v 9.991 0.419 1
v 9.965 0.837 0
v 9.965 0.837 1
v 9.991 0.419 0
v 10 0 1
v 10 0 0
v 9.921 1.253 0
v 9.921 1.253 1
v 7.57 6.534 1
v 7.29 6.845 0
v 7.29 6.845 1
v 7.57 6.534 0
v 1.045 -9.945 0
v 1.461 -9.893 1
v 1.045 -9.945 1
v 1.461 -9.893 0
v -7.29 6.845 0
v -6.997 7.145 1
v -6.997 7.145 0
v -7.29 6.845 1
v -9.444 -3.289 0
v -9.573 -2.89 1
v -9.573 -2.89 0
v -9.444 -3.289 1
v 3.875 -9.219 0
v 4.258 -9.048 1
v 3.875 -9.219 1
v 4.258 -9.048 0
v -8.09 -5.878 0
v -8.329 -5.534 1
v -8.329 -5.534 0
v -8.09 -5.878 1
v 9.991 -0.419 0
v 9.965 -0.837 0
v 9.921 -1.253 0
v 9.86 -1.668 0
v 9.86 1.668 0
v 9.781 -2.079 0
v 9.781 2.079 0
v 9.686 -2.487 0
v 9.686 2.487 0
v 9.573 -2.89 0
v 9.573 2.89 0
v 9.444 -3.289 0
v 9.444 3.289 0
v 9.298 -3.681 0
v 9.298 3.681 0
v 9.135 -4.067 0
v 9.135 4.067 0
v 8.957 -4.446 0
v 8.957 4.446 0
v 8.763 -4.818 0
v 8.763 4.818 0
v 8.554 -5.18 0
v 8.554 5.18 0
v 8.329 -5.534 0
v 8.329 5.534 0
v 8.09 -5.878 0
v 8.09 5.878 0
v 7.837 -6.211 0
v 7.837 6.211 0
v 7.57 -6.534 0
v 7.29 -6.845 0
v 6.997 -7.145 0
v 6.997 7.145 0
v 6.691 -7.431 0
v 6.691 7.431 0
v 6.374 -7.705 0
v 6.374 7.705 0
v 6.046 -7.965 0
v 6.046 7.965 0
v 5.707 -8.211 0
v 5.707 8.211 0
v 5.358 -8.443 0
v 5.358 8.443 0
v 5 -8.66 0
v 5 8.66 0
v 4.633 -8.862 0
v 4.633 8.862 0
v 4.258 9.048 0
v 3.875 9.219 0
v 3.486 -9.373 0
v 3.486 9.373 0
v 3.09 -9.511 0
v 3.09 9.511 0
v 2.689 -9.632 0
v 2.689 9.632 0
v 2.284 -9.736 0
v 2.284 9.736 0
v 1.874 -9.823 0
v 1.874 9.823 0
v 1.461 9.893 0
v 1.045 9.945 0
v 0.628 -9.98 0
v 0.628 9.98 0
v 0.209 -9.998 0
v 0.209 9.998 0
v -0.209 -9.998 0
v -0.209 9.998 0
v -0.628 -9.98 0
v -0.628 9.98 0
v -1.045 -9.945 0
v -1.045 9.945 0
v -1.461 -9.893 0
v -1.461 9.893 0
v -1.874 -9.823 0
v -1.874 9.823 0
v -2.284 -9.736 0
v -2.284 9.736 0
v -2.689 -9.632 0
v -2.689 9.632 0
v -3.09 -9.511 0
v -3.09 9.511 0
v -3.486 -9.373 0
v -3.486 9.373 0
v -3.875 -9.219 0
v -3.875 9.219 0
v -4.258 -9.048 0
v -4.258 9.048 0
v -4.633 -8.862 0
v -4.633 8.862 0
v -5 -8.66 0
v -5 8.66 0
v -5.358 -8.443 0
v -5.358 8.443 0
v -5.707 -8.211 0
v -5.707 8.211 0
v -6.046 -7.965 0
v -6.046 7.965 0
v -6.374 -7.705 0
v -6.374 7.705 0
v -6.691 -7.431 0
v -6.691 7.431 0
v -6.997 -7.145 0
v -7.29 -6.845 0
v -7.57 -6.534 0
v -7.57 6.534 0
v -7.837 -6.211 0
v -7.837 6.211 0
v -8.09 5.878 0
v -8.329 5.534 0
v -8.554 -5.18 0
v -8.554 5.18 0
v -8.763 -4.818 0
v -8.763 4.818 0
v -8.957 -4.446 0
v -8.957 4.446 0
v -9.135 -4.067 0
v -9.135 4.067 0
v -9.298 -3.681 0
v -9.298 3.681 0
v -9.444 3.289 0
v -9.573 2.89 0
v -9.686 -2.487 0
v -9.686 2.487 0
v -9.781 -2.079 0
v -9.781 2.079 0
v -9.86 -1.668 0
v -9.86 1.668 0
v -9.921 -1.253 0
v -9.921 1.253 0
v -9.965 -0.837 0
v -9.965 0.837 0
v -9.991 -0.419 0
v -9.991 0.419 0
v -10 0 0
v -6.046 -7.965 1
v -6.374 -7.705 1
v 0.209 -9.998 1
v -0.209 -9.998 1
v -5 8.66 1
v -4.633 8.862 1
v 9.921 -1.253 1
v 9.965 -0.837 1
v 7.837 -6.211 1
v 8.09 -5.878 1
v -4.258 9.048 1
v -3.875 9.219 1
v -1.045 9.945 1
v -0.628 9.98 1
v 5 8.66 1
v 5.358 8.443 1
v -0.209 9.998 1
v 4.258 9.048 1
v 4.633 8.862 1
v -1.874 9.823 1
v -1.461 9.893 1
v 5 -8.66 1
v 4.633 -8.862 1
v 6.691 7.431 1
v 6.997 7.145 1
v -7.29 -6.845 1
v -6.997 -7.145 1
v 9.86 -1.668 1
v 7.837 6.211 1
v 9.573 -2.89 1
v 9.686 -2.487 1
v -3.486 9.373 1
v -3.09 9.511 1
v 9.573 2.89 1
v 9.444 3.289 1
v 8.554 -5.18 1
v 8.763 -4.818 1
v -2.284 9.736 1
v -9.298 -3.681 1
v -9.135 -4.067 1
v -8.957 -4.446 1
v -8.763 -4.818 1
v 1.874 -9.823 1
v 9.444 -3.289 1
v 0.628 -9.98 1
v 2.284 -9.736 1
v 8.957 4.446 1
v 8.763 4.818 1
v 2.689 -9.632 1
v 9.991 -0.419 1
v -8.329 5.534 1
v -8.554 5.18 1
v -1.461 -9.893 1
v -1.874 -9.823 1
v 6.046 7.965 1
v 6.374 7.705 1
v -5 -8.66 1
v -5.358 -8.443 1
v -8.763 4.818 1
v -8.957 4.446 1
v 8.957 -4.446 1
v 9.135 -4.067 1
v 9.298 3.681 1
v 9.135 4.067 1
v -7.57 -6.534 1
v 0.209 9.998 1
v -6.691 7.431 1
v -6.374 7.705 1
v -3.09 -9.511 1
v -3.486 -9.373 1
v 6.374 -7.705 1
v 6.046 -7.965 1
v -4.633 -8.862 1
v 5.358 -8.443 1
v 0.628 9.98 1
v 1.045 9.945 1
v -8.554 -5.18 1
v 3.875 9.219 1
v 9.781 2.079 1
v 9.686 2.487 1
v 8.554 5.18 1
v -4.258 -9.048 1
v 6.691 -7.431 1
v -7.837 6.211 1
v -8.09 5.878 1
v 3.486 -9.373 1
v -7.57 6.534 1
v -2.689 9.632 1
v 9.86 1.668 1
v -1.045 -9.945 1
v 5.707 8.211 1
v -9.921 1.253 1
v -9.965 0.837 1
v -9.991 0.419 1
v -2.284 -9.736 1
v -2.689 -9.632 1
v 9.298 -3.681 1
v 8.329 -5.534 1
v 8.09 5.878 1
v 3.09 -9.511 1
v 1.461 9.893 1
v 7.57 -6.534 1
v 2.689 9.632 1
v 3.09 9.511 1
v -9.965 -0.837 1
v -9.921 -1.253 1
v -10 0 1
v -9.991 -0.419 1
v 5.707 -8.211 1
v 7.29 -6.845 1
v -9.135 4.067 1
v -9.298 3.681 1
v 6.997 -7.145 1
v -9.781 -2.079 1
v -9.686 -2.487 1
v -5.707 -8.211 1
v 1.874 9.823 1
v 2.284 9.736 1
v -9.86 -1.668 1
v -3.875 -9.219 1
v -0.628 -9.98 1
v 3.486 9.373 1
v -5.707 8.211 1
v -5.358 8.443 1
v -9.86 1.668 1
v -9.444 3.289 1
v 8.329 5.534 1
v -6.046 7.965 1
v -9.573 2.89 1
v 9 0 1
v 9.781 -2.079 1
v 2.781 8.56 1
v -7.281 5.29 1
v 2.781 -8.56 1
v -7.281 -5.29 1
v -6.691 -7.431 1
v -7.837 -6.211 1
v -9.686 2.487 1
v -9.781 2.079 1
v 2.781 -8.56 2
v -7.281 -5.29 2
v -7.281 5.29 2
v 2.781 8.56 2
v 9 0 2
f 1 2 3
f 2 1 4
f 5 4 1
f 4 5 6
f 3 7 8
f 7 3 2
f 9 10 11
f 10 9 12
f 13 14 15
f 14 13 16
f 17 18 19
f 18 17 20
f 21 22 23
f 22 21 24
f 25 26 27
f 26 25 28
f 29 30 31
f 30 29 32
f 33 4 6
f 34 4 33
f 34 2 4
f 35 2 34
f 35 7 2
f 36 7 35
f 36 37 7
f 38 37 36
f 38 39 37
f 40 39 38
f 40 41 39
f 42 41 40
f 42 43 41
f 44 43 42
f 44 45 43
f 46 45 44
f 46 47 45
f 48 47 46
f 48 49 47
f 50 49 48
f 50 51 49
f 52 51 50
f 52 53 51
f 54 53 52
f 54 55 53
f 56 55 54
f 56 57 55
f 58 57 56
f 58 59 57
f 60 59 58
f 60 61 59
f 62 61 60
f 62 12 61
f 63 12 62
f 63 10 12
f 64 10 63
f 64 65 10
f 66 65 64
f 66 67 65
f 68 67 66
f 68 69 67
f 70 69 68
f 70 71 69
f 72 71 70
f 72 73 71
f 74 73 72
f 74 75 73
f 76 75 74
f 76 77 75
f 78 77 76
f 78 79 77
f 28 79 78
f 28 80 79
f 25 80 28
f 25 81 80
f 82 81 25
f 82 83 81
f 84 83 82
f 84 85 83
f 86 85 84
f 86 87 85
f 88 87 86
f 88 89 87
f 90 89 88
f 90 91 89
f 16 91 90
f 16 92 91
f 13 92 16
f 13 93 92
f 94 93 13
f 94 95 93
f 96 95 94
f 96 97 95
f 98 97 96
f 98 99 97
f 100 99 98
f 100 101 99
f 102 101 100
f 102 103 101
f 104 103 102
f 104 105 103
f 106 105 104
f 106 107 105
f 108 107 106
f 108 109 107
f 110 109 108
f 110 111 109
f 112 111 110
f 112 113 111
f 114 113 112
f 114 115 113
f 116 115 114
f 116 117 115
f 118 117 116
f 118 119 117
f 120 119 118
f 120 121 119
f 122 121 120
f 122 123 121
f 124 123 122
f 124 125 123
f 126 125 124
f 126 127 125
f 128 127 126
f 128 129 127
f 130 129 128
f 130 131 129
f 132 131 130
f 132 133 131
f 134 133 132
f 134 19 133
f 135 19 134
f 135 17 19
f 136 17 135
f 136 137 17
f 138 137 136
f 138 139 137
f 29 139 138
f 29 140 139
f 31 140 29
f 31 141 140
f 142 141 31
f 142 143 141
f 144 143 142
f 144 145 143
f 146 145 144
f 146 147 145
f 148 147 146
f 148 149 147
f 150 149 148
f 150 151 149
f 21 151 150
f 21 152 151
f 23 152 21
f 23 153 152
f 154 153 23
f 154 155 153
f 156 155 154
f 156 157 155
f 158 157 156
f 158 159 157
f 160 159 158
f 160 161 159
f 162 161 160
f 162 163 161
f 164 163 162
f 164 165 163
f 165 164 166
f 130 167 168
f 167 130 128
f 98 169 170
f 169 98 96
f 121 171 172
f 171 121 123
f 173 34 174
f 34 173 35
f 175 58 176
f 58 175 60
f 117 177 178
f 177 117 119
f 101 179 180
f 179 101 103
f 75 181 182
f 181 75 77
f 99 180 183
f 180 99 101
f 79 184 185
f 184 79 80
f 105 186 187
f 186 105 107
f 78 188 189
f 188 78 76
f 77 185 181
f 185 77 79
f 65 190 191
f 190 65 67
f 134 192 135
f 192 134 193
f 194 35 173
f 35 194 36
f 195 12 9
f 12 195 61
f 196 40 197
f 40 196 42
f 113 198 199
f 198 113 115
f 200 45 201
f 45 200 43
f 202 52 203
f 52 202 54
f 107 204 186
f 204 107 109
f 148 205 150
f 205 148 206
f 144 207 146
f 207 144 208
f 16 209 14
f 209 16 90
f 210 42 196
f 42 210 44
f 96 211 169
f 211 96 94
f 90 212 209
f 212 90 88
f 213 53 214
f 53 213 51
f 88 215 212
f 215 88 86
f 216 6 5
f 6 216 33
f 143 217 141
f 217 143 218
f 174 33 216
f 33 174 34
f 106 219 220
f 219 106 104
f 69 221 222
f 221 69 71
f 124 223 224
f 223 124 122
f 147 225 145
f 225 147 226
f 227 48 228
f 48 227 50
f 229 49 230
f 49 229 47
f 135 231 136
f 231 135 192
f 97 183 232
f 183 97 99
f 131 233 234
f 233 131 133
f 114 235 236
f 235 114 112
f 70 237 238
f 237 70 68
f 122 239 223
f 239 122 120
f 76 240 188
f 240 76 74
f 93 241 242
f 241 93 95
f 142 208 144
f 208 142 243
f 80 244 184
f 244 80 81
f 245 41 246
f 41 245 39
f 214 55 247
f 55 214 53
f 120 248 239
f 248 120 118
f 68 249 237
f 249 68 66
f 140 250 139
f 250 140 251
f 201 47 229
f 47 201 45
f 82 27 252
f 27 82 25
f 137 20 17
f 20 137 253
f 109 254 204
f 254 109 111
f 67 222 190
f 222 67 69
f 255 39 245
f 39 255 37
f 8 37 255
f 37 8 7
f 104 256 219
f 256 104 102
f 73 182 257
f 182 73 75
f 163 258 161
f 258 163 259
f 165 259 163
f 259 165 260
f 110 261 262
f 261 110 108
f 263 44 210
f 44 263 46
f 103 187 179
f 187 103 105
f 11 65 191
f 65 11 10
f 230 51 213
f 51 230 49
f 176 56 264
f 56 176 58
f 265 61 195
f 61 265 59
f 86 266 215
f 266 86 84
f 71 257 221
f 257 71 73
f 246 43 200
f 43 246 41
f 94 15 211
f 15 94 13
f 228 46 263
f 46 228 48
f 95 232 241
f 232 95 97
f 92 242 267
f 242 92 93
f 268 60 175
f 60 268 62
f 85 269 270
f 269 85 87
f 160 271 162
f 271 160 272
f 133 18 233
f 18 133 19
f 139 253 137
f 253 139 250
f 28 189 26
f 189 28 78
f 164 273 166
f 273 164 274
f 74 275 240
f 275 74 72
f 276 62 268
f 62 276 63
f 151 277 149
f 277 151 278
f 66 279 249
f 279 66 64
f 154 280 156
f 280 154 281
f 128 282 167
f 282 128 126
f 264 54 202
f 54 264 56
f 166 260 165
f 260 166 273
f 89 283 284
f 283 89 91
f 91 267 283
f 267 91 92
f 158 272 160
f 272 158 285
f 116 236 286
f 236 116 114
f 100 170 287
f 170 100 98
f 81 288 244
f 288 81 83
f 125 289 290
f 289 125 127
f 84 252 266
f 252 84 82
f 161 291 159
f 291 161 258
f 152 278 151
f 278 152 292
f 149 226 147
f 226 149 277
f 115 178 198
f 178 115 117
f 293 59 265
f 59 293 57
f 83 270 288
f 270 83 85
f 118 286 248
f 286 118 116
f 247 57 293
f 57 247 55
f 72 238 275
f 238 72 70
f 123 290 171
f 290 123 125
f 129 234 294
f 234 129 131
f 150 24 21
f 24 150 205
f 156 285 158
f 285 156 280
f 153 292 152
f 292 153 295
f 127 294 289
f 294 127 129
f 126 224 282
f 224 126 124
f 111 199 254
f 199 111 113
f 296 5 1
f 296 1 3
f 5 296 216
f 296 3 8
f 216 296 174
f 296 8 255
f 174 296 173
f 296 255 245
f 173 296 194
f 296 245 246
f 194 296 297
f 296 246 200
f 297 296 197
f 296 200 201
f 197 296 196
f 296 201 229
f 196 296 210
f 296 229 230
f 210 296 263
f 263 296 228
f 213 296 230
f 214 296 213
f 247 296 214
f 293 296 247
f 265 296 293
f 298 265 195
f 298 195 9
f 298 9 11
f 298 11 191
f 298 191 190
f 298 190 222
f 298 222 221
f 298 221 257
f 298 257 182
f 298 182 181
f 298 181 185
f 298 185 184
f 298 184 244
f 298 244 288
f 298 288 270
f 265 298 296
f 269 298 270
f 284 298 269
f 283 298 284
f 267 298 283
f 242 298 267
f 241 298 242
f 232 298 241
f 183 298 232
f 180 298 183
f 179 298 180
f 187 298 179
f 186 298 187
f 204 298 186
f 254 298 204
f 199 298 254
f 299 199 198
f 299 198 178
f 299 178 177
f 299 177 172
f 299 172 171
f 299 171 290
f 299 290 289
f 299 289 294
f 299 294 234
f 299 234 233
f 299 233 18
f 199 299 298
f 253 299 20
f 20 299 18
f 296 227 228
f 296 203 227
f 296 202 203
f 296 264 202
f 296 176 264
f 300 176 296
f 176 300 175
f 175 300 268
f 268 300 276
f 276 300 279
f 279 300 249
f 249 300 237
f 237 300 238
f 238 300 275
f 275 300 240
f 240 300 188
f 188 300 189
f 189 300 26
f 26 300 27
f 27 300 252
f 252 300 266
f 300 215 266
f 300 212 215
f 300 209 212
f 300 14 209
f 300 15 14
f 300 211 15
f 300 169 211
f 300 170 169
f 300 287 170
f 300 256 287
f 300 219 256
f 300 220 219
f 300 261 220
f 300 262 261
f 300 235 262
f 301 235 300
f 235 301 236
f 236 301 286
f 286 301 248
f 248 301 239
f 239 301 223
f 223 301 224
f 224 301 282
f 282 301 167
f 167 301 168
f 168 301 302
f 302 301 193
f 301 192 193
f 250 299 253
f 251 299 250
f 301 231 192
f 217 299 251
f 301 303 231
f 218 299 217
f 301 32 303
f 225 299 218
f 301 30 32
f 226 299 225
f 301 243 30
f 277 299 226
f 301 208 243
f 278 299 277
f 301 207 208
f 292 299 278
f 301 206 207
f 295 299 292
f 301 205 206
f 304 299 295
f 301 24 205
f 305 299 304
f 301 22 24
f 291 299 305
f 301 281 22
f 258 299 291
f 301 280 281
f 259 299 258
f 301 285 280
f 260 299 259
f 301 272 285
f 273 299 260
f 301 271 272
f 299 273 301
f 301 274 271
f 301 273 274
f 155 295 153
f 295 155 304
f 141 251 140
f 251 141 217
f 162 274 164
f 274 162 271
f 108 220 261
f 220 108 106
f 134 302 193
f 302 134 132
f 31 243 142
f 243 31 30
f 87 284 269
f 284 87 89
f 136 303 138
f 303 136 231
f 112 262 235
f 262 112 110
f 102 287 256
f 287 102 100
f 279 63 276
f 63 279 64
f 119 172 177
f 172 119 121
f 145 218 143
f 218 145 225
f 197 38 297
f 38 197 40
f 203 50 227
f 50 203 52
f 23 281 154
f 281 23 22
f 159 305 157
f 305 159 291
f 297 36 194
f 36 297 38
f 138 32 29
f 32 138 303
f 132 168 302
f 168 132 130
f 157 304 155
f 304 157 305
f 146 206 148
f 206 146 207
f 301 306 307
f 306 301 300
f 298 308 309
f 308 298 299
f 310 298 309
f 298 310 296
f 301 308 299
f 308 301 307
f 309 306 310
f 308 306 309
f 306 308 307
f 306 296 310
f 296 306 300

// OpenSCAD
$fn = 150;

union() {
	cylinder(d = 20.0, h = 1.0);
	color(alpha = 1.0, c = "grey") {
		translate(v = [0, 0, 1.0]) {
			cylinder($fn = 5, d = 18.0, h = 1.0);
		}
	}
}
